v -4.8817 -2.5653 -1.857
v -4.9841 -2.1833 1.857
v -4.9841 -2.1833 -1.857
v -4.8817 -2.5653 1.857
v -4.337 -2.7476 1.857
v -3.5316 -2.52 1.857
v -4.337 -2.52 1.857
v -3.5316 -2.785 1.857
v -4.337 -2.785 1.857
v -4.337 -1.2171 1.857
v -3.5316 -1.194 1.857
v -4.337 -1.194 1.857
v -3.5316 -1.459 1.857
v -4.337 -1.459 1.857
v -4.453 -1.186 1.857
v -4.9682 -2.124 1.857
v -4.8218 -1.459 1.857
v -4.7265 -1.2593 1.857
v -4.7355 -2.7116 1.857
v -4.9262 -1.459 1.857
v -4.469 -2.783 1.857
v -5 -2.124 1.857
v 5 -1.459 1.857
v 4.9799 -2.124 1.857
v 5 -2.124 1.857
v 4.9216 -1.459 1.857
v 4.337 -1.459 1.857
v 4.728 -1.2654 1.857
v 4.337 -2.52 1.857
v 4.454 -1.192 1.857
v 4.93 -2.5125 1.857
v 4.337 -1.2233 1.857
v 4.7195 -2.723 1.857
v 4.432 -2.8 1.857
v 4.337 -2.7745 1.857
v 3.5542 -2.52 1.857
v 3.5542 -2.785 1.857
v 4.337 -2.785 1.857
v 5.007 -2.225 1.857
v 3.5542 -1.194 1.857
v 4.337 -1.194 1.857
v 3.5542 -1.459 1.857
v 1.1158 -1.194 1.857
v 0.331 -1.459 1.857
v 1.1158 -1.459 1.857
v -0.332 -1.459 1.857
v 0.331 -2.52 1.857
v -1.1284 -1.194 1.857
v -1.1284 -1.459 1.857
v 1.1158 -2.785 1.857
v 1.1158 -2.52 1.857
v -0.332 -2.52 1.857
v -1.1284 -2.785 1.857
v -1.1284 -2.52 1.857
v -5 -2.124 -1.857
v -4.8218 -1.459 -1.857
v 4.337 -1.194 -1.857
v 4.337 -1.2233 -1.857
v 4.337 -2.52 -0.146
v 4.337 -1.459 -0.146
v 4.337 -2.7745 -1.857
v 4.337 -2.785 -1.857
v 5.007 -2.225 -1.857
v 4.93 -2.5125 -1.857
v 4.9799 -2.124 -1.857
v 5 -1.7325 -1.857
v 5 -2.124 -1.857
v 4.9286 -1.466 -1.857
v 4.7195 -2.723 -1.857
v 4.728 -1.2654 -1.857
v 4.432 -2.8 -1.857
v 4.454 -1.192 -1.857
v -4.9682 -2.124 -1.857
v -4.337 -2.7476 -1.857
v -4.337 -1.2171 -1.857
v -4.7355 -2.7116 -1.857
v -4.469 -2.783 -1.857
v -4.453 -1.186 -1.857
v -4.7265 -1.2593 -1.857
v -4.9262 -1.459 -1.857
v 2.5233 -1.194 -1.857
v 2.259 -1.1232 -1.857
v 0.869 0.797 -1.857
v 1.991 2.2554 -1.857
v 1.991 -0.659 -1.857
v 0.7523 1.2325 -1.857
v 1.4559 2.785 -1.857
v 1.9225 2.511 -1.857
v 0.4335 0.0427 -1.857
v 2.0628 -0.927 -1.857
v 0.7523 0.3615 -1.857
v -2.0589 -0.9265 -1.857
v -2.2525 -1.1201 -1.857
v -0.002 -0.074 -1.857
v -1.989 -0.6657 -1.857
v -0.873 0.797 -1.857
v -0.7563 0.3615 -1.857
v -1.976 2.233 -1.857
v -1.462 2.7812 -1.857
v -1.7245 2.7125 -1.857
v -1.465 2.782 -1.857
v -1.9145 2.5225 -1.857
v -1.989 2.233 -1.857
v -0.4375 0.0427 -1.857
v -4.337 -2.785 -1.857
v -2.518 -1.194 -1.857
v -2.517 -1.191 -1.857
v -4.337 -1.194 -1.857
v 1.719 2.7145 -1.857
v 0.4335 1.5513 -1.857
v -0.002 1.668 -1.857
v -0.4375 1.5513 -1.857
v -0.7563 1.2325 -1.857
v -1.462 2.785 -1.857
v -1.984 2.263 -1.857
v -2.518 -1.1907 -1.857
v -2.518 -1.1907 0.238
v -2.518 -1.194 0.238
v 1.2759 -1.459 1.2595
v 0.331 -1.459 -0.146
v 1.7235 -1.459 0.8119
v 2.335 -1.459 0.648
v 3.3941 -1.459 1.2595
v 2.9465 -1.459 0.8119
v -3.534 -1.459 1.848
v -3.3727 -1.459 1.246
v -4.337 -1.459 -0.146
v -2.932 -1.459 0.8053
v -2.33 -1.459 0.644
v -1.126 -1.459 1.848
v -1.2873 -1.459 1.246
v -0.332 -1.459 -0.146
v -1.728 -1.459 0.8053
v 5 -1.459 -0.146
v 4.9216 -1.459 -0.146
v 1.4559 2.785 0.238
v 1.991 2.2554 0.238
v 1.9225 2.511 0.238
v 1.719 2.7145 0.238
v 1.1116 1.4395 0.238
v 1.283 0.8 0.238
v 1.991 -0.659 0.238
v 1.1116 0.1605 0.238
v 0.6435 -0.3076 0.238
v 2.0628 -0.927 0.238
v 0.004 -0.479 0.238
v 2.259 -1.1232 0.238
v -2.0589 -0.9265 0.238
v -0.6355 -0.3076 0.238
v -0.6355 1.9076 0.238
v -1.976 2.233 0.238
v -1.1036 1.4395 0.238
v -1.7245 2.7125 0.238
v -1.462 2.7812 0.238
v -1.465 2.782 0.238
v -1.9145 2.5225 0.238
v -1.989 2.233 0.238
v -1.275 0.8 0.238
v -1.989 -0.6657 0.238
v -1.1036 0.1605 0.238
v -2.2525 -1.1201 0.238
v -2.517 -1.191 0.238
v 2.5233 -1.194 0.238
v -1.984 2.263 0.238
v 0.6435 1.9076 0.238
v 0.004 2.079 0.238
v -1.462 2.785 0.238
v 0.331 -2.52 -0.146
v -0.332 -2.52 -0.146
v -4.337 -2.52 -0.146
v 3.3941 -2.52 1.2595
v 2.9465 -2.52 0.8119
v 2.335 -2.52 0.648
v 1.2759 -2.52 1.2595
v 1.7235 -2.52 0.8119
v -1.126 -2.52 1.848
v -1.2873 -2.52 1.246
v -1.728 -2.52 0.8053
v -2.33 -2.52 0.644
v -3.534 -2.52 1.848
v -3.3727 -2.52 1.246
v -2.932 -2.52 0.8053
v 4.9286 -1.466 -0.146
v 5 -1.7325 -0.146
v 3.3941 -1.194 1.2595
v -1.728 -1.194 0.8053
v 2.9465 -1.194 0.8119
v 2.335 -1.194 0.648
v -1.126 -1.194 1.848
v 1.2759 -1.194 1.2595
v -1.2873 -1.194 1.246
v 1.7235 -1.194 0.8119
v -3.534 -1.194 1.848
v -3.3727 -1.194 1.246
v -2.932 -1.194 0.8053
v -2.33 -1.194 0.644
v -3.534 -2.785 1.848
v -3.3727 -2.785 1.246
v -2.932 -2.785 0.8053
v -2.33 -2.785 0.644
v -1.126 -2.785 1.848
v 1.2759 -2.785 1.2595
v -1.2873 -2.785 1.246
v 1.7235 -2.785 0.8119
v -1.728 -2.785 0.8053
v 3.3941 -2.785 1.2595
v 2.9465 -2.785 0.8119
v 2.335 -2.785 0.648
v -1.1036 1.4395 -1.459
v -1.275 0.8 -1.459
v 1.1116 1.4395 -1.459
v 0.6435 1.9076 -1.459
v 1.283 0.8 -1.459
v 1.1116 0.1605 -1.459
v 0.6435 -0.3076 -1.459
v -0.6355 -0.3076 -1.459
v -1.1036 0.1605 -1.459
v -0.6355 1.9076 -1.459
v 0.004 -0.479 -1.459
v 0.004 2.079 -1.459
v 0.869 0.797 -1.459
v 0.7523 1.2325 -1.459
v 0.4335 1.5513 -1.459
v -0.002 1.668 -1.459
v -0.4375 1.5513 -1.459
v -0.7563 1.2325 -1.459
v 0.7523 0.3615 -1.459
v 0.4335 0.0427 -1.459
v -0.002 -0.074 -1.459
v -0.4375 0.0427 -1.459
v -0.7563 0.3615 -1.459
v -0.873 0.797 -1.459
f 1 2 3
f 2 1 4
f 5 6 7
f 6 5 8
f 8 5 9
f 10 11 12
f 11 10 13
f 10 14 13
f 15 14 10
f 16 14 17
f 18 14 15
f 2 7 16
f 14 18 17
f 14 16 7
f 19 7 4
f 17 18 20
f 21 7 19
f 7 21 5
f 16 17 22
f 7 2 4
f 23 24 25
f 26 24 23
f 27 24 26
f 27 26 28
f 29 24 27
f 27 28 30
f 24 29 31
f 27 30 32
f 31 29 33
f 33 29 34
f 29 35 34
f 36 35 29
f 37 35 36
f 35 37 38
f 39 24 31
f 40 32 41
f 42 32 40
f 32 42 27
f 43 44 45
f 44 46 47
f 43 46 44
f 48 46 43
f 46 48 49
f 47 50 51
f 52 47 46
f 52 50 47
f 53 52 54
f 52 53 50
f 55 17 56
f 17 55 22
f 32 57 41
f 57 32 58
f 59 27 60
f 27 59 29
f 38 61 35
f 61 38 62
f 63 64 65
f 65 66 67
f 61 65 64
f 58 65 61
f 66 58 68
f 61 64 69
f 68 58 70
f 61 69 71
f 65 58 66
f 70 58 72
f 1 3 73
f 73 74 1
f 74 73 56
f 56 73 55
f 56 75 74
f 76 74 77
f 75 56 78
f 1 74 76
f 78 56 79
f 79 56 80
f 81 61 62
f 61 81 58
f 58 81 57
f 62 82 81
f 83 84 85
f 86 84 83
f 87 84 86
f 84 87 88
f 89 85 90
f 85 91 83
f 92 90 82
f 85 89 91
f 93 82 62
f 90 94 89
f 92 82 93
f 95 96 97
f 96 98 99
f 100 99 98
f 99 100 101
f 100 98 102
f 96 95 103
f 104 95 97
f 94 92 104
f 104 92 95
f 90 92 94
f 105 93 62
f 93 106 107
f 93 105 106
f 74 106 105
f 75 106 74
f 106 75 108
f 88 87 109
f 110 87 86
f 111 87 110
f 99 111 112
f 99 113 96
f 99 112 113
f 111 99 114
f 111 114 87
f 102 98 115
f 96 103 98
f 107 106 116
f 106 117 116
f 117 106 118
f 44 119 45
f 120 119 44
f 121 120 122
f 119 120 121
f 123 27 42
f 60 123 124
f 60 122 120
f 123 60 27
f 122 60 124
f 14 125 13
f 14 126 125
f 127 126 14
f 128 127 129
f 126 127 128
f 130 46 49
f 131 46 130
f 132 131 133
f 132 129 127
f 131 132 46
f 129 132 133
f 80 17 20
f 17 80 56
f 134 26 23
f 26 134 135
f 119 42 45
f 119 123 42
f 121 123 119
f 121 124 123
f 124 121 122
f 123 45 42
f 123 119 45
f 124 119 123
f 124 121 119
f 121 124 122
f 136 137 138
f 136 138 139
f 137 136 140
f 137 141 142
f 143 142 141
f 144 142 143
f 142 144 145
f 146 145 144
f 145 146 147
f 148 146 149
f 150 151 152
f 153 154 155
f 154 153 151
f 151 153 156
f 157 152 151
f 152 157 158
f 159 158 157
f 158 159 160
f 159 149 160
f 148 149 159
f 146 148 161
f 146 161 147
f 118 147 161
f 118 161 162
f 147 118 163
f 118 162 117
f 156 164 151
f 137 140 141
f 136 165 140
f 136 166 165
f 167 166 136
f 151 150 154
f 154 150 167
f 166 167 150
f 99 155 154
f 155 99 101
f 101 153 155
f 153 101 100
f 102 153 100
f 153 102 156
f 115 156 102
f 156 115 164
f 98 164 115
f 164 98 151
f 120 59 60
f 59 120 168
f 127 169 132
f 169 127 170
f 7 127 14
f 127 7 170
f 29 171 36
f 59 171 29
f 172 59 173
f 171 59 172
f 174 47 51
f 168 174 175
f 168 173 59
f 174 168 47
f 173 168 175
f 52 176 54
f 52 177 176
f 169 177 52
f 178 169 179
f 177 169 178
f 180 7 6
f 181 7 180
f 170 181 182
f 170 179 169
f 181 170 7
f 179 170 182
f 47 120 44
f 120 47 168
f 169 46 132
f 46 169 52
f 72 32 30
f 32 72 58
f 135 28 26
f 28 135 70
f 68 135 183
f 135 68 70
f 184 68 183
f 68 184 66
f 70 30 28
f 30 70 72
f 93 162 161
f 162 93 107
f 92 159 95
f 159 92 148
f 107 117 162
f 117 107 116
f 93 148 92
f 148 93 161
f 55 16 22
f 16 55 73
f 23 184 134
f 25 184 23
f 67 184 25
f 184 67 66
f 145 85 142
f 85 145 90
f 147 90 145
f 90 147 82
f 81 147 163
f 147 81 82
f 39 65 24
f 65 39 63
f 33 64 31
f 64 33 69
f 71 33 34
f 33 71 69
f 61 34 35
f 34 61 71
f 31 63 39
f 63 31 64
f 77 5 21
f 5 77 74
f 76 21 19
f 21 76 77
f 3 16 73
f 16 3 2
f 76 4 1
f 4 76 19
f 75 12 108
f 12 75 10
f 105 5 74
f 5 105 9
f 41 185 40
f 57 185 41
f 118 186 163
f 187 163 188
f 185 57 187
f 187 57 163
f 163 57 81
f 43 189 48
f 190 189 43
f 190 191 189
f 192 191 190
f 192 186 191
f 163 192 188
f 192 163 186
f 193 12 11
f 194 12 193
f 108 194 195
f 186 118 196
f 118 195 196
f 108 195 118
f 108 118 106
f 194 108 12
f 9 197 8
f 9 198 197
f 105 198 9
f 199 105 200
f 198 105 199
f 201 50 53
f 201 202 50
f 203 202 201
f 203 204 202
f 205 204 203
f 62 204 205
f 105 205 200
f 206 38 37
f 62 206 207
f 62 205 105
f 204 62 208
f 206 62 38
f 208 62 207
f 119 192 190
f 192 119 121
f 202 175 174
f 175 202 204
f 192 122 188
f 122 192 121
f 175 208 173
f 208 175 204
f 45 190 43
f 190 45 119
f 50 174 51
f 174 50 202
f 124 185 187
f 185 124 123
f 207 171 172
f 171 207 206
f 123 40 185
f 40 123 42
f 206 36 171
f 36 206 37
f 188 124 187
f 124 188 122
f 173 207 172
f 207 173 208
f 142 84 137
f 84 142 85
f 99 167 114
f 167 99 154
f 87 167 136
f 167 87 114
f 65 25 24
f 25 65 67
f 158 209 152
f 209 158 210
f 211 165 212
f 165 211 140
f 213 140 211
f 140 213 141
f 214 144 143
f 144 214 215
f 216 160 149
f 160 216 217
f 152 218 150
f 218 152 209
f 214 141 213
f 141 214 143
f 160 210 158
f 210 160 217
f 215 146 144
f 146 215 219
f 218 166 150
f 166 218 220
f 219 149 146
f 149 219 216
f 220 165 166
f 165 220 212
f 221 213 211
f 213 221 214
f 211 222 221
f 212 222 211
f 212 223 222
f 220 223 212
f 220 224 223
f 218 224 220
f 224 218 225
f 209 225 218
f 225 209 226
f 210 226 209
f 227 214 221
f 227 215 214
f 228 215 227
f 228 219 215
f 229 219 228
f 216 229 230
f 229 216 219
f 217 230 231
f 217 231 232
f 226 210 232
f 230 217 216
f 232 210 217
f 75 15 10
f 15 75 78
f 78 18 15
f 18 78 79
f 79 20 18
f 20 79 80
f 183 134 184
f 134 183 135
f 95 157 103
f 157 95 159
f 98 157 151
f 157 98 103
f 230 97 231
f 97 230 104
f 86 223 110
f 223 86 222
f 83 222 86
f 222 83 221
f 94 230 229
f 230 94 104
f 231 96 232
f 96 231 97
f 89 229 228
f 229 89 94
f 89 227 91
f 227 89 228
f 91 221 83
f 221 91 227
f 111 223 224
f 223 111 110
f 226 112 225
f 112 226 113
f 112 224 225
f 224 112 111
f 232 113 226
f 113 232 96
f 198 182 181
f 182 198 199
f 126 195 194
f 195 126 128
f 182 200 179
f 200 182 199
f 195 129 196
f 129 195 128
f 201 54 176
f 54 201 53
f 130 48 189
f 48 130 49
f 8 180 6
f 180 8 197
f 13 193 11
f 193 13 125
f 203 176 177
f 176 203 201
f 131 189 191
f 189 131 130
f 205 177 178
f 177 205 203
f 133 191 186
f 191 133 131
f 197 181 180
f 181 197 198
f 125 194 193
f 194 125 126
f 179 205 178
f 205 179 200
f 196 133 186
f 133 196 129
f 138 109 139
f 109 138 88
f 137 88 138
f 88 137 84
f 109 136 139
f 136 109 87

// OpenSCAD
intersection() {
translate([-6, -3.342, -2.228]) cube(size = [12, 6.684, 4.456], center = false);
union() {
intersection() {
difference() {
union() {
rotate([0, 0, 0])
translate([-2.518, -1.74, -1.857]) cube(size = [5.044, 1.081, 2.095], center = false);
translate([-1.465, 2.263, -1.857])
cylinder(h = 2.095, r1 = 0.519, r2 = 0.519, center = false, $fn = 12);
difference() {
translate([2.954, -2.124, -18.1])
cylinder(h = 19.957, r1 = 7.954, r2 = 7.954, center = false, $fn = 12);
rotate([0, 0, 0])
translate([-2.518, -1.459, -1.857]) cube(size = [6.855, 4.244, 3.714], center = false);
}
}
union() {
difference() {
rotate([0, 0, 0])
translate([-4.337, -2.52, -0.146]) cube(size = [8.674, 1.061, 18.246], center = false);
rotate([0, 0, 0])
translate([-0.332, -2.52, -1.459]) cube(size = [0.663, 1.861, 19.559], center = false);
}
difference() {
rotate([0, 0, 0])
translate([4.337, -1.74, -18.1]) cube(size = [13.763, 4.525, 19.957], center = false);
translate([4.454, -1.74, -1.857])
cylinder(h = 3.714, r1 = 0.548, r2 = 0.548, center = false, $fn = 12);
}
}
}
union() {
translate([4.432, -2.225, -1.857])
cylinder(h = 3.714, r1 = 0.575, r2 = 0.575, center = false, $fn = 12);
difference() {
union() {
rotate([0, 0, 0])
translate([-2.518, -2.52, -1.857]) cube(size = [4.508, 5.305, 2.095], center = false);
rotate([0, 0, 0])
translate([-18.1, -2.52, -1.857]) cube(size = [22.437, 1.061, 3.714], center = false);
}
union() {
translate([-2.517, -0.662, -1.857])
cylinder(h = 2.095, r1 = 0.529, r2 = 0.529, center = false, $fn = 12);
rotate([0, 0, 0])
translate([-18.1, -2.52, -18.1]) cube(size = [13.763, 0.396, 19.957], center = false);
}
}
translate([-4.469, -2.25, -1.857])
cylinder(h = 3.714, r1 = 0.533, r2 = 0.533, center = false, $fn = 12);
difference() {
rotate([0, 0, 0])
translate([1.99, -1.74, -1.857]) cube(size = [3.01, 1.081, 3.714], center = false);
translate([2.527, -0.659, -1.857])
cylinder(h = 19.957, r1 = 0.536, r2 = 0.536, center = false, $fn = 12);
}
}
}
difference() {
union() {
difference() {
rotate([0, 0, 0])
translate([-4.337, -2.785, -1.857]) cube(size = [8.674, 1.591, 3.714], center = false);
rotate([180, 90, -90])
translate([-1.871, -2.335, -18.1])
cylinder(h = 36.2, r1 = 1.223, r2 = 1.223, center = false, $fn = 12);
}
rotate([0, 0, 0])
translate([-0.332, -2.124, -1.857]) cube(size = [5.332, 0.384, 2.095], center = false);
difference() {
rotate([0, 0, 0])
translate([-1.462, -2.124, -1.857]) cube(size = [3.453, 4.909, 2.095], center = false);
translate([0.004, 0.8, -1.459])
cylinder(h = 19.559, r1 = 1.279, r2 = 1.279, center = false, $fn = 12);
}
translate([-4.453, -1.733, -1.857])
cylinder(h = 3.714, r1 = 0.547, r2 = 0.547, center = false, $fn = 12);
rotate([0, 0, 0])
translate([-4.337, -2.124, -0.146]) cube(size = [9.337, 0.665, 2.003], center = false);
rotate([0, 0, 0])
translate([-1.989, -1.74, -1.857]) cube(size = [0.527, 3.973, 2.095], center = false);
}
union() {
difference() {
rotate([0, 0, 0])
translate([-18.1, -2.52, -1.857]) cube(size = [22.437, 4.753, 3.714], center = false);
difference() {
rotate([0, 0, 0])
translate([-18.1, -1.459, -1.857]) cube(size = [22.437, 3.692, 3.714], center = false);
translate([-0.002, 0.797, -1.857])
cylinder(h = 19.957, r1 = 0.871, r2 = 0.871, center = false, $fn = 12);
}
}
difference() {
union() {
rotate([0, 0, 0])
translate([1.443, 2.233, -18.1]) cube(size = [16.657, 15.867, 36.2], center = false);
rotate([180, 90, -90])
translate([-1.848, 2.33, -2.785])
cylinder(h = 5.57, r1 = 1.204, r2 = 1.204, center = false, $fn = 12);
}
translate([1.441, 2.233, -18.1])
cylinder(h = 18.339, r1 = 0.556, r2 = 0.556, center = false, $fn = 12);
}
}
}
}
}
